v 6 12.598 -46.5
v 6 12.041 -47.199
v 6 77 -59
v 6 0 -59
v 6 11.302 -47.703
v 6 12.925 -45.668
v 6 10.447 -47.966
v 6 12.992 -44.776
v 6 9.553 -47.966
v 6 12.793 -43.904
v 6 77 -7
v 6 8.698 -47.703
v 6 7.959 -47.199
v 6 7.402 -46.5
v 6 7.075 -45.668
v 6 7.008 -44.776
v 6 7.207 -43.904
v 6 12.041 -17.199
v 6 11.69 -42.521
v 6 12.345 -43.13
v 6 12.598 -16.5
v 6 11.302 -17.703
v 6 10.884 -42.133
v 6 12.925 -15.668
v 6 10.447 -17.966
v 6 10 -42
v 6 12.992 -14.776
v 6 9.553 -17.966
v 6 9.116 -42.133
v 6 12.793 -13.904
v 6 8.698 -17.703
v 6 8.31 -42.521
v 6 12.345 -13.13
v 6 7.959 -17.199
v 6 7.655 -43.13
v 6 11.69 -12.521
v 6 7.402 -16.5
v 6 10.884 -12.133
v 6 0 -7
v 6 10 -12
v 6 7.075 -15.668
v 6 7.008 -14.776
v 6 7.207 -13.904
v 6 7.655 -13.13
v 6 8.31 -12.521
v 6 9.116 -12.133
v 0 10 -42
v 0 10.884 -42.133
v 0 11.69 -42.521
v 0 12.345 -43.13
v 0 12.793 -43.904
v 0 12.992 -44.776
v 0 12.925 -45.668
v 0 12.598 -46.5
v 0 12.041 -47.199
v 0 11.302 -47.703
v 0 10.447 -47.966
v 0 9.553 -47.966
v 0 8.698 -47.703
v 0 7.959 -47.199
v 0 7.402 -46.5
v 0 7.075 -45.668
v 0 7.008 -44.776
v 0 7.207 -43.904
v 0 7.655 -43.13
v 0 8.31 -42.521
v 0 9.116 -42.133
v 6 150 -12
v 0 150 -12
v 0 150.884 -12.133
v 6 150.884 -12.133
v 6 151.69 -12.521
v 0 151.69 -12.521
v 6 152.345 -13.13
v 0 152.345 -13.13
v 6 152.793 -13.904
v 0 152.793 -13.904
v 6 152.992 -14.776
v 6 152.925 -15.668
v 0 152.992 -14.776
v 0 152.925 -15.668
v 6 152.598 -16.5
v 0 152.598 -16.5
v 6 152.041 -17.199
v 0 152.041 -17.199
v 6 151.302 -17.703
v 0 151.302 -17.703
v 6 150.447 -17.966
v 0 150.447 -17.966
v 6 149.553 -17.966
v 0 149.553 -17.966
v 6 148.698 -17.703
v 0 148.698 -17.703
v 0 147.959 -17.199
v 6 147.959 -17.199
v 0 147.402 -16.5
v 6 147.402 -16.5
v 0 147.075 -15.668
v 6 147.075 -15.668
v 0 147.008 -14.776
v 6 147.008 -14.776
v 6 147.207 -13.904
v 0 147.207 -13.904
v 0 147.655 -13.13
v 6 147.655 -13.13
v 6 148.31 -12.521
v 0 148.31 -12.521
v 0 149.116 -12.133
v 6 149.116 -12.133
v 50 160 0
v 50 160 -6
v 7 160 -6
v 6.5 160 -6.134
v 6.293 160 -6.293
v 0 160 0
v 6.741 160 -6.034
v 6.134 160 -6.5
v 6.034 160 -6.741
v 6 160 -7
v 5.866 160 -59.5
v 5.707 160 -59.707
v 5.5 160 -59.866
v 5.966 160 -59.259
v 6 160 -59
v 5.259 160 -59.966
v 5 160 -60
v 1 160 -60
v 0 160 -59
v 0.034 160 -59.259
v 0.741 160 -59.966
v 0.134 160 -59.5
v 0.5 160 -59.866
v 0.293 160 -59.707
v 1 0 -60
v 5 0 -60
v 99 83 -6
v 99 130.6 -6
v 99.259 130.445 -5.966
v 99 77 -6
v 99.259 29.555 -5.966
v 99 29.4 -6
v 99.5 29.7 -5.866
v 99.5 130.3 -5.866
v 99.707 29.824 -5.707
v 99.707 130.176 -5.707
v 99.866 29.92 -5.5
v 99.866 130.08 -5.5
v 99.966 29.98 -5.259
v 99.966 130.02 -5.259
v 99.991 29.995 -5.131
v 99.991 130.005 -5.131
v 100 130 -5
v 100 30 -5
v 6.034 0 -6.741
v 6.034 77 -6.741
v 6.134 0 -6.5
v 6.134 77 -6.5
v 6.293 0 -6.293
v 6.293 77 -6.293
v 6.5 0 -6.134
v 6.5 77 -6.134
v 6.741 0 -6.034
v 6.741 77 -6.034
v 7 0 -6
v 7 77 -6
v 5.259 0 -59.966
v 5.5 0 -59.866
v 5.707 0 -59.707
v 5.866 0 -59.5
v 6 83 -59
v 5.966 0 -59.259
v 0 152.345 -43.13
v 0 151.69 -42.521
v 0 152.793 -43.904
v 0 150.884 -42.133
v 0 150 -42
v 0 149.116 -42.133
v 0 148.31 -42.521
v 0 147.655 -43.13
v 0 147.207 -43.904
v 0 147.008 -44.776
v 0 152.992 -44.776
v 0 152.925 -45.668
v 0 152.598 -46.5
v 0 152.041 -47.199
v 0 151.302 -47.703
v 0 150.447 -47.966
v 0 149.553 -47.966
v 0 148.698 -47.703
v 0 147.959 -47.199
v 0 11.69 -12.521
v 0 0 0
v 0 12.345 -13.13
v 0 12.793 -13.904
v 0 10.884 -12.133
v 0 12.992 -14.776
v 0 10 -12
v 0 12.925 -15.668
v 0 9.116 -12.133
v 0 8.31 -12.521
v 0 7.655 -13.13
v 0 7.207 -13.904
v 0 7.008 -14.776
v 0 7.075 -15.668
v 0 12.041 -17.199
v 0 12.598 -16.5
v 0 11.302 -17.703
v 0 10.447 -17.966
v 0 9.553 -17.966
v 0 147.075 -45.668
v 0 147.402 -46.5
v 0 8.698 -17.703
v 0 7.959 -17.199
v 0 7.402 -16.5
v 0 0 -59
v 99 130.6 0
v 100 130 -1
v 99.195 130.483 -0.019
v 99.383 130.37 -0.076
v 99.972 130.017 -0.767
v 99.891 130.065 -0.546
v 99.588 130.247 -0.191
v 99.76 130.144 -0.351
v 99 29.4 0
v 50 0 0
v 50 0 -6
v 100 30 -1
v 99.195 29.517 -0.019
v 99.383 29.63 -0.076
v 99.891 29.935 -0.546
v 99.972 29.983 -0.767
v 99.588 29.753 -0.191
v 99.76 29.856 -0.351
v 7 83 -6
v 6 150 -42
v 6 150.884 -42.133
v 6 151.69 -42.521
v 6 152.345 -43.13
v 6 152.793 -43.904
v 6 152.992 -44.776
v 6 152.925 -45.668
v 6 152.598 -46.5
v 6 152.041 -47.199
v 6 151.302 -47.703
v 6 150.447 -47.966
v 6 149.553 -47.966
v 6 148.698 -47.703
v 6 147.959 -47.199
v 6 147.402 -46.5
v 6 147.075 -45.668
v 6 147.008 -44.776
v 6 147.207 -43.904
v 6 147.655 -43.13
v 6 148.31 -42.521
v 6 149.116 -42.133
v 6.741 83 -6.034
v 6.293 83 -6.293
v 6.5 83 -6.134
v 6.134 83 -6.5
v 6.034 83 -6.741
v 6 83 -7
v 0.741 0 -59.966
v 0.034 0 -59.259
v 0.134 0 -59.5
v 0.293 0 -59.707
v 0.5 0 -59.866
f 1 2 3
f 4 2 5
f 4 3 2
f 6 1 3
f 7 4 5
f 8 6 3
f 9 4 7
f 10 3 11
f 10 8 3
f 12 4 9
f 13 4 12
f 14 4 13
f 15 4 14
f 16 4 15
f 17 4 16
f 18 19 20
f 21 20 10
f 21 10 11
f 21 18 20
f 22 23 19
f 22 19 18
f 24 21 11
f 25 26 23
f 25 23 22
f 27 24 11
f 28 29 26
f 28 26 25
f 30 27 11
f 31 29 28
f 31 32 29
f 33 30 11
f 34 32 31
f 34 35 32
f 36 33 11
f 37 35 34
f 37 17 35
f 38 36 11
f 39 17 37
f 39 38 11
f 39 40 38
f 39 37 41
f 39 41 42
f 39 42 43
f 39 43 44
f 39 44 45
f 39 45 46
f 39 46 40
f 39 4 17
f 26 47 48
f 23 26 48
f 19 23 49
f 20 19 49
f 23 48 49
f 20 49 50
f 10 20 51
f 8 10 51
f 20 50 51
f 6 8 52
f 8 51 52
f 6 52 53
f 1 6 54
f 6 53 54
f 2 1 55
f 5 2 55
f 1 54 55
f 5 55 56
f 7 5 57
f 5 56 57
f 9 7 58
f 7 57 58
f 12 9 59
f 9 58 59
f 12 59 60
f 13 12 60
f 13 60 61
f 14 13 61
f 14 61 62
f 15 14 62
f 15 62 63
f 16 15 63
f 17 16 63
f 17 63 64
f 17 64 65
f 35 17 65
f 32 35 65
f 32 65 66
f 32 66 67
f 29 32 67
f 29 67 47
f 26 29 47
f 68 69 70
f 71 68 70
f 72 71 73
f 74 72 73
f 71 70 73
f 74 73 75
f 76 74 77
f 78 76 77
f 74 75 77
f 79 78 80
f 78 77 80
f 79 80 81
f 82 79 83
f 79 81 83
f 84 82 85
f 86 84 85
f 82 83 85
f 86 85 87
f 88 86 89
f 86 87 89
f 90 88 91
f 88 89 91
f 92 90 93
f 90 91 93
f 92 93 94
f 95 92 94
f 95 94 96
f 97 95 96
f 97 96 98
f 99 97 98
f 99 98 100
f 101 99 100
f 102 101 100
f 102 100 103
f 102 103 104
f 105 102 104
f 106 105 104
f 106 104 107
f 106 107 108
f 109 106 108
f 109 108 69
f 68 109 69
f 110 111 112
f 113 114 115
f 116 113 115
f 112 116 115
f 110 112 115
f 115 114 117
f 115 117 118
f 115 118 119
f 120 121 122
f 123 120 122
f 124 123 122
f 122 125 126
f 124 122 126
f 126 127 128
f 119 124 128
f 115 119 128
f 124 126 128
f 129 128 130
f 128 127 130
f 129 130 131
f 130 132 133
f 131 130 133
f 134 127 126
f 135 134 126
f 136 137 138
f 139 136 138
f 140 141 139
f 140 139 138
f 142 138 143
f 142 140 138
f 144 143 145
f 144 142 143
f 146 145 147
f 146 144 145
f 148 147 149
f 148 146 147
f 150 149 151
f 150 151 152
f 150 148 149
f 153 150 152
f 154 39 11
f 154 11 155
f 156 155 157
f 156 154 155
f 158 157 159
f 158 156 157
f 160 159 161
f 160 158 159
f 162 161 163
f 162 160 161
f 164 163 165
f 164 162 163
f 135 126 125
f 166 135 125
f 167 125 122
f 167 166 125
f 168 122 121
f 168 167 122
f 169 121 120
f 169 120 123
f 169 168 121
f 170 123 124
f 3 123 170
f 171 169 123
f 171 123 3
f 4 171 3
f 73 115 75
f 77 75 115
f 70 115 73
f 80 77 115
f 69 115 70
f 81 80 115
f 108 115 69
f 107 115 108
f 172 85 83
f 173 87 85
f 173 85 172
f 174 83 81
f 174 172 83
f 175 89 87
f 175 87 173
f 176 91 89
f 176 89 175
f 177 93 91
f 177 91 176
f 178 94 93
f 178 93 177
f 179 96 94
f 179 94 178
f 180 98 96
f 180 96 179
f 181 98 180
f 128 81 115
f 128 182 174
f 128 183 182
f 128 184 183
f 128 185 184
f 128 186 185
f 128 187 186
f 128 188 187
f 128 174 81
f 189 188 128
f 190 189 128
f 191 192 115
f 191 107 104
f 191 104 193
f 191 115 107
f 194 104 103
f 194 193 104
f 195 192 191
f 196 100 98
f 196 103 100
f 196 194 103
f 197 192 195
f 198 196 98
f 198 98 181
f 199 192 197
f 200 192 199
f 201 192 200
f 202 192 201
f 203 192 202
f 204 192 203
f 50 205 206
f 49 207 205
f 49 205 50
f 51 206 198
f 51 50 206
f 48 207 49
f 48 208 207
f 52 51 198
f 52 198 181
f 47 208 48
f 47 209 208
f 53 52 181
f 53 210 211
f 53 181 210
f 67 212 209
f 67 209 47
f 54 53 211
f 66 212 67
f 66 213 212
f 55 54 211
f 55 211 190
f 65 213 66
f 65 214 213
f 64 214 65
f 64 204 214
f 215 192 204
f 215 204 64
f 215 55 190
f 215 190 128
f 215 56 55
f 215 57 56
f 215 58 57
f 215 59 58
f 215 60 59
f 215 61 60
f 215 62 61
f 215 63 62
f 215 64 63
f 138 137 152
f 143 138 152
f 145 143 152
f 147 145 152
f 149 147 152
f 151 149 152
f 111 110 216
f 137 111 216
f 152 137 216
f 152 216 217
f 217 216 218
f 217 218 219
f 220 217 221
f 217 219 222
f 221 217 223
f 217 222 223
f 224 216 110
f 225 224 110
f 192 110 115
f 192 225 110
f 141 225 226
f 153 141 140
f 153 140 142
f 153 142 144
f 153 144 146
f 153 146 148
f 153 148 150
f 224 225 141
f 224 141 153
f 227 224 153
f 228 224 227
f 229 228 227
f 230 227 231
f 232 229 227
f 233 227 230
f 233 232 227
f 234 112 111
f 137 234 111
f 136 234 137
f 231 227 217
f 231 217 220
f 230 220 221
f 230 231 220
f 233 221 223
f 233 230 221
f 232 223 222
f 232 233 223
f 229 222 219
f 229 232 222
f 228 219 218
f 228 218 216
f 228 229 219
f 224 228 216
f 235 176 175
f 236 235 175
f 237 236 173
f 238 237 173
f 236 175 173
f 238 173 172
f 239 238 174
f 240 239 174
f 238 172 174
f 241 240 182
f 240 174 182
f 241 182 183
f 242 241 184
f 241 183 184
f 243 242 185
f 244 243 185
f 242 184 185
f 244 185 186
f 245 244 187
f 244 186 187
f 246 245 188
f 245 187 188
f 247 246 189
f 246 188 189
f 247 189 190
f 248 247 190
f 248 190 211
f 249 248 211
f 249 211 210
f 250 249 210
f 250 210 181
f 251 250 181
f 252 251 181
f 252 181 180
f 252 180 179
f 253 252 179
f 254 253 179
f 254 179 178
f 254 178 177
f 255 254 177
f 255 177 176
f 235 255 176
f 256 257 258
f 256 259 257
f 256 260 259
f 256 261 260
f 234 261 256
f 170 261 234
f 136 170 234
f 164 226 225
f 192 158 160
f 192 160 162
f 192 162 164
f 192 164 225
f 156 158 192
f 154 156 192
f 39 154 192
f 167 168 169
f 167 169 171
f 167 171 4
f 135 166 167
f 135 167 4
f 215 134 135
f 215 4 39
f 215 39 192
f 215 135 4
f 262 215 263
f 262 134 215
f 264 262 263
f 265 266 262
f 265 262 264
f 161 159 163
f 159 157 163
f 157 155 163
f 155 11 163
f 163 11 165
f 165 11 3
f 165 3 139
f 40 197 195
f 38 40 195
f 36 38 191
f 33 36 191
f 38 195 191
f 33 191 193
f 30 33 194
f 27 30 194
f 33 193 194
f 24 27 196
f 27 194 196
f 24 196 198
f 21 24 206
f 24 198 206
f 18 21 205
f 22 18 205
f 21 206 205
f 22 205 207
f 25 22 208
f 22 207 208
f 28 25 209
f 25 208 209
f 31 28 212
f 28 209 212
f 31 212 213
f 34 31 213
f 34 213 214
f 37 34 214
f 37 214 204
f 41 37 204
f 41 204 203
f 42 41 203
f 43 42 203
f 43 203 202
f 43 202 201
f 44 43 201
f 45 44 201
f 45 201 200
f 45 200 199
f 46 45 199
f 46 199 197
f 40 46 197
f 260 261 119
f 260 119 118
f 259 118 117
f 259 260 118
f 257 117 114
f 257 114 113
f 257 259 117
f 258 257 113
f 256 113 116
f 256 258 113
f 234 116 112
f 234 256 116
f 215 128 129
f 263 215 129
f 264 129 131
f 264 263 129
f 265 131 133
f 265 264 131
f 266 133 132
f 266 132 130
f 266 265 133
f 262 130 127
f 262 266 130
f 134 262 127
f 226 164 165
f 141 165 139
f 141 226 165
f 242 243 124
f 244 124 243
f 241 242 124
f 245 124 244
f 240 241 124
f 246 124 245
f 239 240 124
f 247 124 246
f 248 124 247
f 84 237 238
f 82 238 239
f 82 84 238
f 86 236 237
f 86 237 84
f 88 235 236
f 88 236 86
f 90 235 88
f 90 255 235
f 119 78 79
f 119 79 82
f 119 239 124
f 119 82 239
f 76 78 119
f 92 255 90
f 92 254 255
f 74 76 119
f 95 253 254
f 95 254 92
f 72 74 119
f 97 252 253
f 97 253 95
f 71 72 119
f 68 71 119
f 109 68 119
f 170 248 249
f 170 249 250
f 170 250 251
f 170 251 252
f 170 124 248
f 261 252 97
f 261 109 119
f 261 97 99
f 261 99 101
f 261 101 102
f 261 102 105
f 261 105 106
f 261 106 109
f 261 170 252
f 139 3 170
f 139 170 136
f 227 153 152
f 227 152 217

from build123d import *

# Parameters (mm, degrees)
BOSS_EXTRUDE1_DEPTH = 160
RIB6_REACH          = 143.421
SKETCH4_WALL_W      = 391.884760288
SKETCH4_WALL_H      = 6
CUT_EXTRUDE1_DEPTH  = 198.989898732
SKETCH6_R           = 3
CUT_EXTRUDE2_DEPTH  = 10


with BuildPart() as part:
    # Sketch1 → Boss-Extrude1 (new body)
    with BuildSketch(Plane(origin=(0, 0, 0), x_dir=(1, 0, 0), z_dir=(0, 1, 0))):
        with BuildLine():
            Line((0, 0), (0, 59))
            ThreePointArc((0, 59), (0.292893219, 59.707106781), (1, 60))
            Line((1, 60), (5, 60))
            ThreePointArc((5, 60), (5.707106781, 59.707106781), (6, 59))
            Line((6, 59), (6, 7))
            ThreePointArc((6, 7), (6.292893219, 6.292893219), (7, 6))
            Line((7, 6), (99, 6))
            ThreePointArc((99, 6), (99.707106781, 5.707106781), (100, 5))
            Line((100, 5), (100, 1))
            ThreePointArc((100, 1), (99.707106781, 0.292893219), (99, 0))
            Line((99, 0), (0, 0))
        make_face()
    extrude(amount=BOSS_EXTRUDE1_DEPTH)

    # Sketch4 wall → Rib6 (add, up to next)
    with BuildSketch(Plane(origin=(52.5, 80, -32.5), x_dir=(0.868817459121, 0, 0.495132530467), z_dir=(0.495132530467, 0, -0.868817459121)), mode=Mode.PRIVATE) as rib6_sk1:
        Rectangle(SKETCH4_WALL_W, SKETCH4_WALL_H)
    rib6_tool1 = extrude(rib6_sk1.sketch, amount=-RIB6_REACH, mode=Mode.PRIVATE) - part.part
    add(rib6_tool1.solids().sort_by_distance((52.5, 80, -32.5))[0])

    # Sketch5 → Cut-Extrude1 (cut, through all)
    with BuildSketch(Plane.XY):
        Polygon((100, 160), (50, 160), (100, 130), align=None)
        Polygon((100, 30), (100, 0), (50, 0), align=None)
    extrude(amount=-CUT_EXTRUDE1_DEPTH, mode=Mode.SUBTRACT)

    # Sketch6 → Cut-Extrude2 (cut)
    with BuildSketch(Plane.ZY):
        with Locations((-45, 150)):
            Circle(SKETCH6_R)
        with Locations((-15, 150)):
            Circle(SKETCH6_R)
        with Locations((-15, 10)):
            Circle(SKETCH6_R)
        with Locations((-45, 10)):
            Circle(SKETCH6_R)
    extrude(amount=-CUT_EXTRUDE2_DEPTH, mode=Mode.SUBTRACT)


solid = part.part
